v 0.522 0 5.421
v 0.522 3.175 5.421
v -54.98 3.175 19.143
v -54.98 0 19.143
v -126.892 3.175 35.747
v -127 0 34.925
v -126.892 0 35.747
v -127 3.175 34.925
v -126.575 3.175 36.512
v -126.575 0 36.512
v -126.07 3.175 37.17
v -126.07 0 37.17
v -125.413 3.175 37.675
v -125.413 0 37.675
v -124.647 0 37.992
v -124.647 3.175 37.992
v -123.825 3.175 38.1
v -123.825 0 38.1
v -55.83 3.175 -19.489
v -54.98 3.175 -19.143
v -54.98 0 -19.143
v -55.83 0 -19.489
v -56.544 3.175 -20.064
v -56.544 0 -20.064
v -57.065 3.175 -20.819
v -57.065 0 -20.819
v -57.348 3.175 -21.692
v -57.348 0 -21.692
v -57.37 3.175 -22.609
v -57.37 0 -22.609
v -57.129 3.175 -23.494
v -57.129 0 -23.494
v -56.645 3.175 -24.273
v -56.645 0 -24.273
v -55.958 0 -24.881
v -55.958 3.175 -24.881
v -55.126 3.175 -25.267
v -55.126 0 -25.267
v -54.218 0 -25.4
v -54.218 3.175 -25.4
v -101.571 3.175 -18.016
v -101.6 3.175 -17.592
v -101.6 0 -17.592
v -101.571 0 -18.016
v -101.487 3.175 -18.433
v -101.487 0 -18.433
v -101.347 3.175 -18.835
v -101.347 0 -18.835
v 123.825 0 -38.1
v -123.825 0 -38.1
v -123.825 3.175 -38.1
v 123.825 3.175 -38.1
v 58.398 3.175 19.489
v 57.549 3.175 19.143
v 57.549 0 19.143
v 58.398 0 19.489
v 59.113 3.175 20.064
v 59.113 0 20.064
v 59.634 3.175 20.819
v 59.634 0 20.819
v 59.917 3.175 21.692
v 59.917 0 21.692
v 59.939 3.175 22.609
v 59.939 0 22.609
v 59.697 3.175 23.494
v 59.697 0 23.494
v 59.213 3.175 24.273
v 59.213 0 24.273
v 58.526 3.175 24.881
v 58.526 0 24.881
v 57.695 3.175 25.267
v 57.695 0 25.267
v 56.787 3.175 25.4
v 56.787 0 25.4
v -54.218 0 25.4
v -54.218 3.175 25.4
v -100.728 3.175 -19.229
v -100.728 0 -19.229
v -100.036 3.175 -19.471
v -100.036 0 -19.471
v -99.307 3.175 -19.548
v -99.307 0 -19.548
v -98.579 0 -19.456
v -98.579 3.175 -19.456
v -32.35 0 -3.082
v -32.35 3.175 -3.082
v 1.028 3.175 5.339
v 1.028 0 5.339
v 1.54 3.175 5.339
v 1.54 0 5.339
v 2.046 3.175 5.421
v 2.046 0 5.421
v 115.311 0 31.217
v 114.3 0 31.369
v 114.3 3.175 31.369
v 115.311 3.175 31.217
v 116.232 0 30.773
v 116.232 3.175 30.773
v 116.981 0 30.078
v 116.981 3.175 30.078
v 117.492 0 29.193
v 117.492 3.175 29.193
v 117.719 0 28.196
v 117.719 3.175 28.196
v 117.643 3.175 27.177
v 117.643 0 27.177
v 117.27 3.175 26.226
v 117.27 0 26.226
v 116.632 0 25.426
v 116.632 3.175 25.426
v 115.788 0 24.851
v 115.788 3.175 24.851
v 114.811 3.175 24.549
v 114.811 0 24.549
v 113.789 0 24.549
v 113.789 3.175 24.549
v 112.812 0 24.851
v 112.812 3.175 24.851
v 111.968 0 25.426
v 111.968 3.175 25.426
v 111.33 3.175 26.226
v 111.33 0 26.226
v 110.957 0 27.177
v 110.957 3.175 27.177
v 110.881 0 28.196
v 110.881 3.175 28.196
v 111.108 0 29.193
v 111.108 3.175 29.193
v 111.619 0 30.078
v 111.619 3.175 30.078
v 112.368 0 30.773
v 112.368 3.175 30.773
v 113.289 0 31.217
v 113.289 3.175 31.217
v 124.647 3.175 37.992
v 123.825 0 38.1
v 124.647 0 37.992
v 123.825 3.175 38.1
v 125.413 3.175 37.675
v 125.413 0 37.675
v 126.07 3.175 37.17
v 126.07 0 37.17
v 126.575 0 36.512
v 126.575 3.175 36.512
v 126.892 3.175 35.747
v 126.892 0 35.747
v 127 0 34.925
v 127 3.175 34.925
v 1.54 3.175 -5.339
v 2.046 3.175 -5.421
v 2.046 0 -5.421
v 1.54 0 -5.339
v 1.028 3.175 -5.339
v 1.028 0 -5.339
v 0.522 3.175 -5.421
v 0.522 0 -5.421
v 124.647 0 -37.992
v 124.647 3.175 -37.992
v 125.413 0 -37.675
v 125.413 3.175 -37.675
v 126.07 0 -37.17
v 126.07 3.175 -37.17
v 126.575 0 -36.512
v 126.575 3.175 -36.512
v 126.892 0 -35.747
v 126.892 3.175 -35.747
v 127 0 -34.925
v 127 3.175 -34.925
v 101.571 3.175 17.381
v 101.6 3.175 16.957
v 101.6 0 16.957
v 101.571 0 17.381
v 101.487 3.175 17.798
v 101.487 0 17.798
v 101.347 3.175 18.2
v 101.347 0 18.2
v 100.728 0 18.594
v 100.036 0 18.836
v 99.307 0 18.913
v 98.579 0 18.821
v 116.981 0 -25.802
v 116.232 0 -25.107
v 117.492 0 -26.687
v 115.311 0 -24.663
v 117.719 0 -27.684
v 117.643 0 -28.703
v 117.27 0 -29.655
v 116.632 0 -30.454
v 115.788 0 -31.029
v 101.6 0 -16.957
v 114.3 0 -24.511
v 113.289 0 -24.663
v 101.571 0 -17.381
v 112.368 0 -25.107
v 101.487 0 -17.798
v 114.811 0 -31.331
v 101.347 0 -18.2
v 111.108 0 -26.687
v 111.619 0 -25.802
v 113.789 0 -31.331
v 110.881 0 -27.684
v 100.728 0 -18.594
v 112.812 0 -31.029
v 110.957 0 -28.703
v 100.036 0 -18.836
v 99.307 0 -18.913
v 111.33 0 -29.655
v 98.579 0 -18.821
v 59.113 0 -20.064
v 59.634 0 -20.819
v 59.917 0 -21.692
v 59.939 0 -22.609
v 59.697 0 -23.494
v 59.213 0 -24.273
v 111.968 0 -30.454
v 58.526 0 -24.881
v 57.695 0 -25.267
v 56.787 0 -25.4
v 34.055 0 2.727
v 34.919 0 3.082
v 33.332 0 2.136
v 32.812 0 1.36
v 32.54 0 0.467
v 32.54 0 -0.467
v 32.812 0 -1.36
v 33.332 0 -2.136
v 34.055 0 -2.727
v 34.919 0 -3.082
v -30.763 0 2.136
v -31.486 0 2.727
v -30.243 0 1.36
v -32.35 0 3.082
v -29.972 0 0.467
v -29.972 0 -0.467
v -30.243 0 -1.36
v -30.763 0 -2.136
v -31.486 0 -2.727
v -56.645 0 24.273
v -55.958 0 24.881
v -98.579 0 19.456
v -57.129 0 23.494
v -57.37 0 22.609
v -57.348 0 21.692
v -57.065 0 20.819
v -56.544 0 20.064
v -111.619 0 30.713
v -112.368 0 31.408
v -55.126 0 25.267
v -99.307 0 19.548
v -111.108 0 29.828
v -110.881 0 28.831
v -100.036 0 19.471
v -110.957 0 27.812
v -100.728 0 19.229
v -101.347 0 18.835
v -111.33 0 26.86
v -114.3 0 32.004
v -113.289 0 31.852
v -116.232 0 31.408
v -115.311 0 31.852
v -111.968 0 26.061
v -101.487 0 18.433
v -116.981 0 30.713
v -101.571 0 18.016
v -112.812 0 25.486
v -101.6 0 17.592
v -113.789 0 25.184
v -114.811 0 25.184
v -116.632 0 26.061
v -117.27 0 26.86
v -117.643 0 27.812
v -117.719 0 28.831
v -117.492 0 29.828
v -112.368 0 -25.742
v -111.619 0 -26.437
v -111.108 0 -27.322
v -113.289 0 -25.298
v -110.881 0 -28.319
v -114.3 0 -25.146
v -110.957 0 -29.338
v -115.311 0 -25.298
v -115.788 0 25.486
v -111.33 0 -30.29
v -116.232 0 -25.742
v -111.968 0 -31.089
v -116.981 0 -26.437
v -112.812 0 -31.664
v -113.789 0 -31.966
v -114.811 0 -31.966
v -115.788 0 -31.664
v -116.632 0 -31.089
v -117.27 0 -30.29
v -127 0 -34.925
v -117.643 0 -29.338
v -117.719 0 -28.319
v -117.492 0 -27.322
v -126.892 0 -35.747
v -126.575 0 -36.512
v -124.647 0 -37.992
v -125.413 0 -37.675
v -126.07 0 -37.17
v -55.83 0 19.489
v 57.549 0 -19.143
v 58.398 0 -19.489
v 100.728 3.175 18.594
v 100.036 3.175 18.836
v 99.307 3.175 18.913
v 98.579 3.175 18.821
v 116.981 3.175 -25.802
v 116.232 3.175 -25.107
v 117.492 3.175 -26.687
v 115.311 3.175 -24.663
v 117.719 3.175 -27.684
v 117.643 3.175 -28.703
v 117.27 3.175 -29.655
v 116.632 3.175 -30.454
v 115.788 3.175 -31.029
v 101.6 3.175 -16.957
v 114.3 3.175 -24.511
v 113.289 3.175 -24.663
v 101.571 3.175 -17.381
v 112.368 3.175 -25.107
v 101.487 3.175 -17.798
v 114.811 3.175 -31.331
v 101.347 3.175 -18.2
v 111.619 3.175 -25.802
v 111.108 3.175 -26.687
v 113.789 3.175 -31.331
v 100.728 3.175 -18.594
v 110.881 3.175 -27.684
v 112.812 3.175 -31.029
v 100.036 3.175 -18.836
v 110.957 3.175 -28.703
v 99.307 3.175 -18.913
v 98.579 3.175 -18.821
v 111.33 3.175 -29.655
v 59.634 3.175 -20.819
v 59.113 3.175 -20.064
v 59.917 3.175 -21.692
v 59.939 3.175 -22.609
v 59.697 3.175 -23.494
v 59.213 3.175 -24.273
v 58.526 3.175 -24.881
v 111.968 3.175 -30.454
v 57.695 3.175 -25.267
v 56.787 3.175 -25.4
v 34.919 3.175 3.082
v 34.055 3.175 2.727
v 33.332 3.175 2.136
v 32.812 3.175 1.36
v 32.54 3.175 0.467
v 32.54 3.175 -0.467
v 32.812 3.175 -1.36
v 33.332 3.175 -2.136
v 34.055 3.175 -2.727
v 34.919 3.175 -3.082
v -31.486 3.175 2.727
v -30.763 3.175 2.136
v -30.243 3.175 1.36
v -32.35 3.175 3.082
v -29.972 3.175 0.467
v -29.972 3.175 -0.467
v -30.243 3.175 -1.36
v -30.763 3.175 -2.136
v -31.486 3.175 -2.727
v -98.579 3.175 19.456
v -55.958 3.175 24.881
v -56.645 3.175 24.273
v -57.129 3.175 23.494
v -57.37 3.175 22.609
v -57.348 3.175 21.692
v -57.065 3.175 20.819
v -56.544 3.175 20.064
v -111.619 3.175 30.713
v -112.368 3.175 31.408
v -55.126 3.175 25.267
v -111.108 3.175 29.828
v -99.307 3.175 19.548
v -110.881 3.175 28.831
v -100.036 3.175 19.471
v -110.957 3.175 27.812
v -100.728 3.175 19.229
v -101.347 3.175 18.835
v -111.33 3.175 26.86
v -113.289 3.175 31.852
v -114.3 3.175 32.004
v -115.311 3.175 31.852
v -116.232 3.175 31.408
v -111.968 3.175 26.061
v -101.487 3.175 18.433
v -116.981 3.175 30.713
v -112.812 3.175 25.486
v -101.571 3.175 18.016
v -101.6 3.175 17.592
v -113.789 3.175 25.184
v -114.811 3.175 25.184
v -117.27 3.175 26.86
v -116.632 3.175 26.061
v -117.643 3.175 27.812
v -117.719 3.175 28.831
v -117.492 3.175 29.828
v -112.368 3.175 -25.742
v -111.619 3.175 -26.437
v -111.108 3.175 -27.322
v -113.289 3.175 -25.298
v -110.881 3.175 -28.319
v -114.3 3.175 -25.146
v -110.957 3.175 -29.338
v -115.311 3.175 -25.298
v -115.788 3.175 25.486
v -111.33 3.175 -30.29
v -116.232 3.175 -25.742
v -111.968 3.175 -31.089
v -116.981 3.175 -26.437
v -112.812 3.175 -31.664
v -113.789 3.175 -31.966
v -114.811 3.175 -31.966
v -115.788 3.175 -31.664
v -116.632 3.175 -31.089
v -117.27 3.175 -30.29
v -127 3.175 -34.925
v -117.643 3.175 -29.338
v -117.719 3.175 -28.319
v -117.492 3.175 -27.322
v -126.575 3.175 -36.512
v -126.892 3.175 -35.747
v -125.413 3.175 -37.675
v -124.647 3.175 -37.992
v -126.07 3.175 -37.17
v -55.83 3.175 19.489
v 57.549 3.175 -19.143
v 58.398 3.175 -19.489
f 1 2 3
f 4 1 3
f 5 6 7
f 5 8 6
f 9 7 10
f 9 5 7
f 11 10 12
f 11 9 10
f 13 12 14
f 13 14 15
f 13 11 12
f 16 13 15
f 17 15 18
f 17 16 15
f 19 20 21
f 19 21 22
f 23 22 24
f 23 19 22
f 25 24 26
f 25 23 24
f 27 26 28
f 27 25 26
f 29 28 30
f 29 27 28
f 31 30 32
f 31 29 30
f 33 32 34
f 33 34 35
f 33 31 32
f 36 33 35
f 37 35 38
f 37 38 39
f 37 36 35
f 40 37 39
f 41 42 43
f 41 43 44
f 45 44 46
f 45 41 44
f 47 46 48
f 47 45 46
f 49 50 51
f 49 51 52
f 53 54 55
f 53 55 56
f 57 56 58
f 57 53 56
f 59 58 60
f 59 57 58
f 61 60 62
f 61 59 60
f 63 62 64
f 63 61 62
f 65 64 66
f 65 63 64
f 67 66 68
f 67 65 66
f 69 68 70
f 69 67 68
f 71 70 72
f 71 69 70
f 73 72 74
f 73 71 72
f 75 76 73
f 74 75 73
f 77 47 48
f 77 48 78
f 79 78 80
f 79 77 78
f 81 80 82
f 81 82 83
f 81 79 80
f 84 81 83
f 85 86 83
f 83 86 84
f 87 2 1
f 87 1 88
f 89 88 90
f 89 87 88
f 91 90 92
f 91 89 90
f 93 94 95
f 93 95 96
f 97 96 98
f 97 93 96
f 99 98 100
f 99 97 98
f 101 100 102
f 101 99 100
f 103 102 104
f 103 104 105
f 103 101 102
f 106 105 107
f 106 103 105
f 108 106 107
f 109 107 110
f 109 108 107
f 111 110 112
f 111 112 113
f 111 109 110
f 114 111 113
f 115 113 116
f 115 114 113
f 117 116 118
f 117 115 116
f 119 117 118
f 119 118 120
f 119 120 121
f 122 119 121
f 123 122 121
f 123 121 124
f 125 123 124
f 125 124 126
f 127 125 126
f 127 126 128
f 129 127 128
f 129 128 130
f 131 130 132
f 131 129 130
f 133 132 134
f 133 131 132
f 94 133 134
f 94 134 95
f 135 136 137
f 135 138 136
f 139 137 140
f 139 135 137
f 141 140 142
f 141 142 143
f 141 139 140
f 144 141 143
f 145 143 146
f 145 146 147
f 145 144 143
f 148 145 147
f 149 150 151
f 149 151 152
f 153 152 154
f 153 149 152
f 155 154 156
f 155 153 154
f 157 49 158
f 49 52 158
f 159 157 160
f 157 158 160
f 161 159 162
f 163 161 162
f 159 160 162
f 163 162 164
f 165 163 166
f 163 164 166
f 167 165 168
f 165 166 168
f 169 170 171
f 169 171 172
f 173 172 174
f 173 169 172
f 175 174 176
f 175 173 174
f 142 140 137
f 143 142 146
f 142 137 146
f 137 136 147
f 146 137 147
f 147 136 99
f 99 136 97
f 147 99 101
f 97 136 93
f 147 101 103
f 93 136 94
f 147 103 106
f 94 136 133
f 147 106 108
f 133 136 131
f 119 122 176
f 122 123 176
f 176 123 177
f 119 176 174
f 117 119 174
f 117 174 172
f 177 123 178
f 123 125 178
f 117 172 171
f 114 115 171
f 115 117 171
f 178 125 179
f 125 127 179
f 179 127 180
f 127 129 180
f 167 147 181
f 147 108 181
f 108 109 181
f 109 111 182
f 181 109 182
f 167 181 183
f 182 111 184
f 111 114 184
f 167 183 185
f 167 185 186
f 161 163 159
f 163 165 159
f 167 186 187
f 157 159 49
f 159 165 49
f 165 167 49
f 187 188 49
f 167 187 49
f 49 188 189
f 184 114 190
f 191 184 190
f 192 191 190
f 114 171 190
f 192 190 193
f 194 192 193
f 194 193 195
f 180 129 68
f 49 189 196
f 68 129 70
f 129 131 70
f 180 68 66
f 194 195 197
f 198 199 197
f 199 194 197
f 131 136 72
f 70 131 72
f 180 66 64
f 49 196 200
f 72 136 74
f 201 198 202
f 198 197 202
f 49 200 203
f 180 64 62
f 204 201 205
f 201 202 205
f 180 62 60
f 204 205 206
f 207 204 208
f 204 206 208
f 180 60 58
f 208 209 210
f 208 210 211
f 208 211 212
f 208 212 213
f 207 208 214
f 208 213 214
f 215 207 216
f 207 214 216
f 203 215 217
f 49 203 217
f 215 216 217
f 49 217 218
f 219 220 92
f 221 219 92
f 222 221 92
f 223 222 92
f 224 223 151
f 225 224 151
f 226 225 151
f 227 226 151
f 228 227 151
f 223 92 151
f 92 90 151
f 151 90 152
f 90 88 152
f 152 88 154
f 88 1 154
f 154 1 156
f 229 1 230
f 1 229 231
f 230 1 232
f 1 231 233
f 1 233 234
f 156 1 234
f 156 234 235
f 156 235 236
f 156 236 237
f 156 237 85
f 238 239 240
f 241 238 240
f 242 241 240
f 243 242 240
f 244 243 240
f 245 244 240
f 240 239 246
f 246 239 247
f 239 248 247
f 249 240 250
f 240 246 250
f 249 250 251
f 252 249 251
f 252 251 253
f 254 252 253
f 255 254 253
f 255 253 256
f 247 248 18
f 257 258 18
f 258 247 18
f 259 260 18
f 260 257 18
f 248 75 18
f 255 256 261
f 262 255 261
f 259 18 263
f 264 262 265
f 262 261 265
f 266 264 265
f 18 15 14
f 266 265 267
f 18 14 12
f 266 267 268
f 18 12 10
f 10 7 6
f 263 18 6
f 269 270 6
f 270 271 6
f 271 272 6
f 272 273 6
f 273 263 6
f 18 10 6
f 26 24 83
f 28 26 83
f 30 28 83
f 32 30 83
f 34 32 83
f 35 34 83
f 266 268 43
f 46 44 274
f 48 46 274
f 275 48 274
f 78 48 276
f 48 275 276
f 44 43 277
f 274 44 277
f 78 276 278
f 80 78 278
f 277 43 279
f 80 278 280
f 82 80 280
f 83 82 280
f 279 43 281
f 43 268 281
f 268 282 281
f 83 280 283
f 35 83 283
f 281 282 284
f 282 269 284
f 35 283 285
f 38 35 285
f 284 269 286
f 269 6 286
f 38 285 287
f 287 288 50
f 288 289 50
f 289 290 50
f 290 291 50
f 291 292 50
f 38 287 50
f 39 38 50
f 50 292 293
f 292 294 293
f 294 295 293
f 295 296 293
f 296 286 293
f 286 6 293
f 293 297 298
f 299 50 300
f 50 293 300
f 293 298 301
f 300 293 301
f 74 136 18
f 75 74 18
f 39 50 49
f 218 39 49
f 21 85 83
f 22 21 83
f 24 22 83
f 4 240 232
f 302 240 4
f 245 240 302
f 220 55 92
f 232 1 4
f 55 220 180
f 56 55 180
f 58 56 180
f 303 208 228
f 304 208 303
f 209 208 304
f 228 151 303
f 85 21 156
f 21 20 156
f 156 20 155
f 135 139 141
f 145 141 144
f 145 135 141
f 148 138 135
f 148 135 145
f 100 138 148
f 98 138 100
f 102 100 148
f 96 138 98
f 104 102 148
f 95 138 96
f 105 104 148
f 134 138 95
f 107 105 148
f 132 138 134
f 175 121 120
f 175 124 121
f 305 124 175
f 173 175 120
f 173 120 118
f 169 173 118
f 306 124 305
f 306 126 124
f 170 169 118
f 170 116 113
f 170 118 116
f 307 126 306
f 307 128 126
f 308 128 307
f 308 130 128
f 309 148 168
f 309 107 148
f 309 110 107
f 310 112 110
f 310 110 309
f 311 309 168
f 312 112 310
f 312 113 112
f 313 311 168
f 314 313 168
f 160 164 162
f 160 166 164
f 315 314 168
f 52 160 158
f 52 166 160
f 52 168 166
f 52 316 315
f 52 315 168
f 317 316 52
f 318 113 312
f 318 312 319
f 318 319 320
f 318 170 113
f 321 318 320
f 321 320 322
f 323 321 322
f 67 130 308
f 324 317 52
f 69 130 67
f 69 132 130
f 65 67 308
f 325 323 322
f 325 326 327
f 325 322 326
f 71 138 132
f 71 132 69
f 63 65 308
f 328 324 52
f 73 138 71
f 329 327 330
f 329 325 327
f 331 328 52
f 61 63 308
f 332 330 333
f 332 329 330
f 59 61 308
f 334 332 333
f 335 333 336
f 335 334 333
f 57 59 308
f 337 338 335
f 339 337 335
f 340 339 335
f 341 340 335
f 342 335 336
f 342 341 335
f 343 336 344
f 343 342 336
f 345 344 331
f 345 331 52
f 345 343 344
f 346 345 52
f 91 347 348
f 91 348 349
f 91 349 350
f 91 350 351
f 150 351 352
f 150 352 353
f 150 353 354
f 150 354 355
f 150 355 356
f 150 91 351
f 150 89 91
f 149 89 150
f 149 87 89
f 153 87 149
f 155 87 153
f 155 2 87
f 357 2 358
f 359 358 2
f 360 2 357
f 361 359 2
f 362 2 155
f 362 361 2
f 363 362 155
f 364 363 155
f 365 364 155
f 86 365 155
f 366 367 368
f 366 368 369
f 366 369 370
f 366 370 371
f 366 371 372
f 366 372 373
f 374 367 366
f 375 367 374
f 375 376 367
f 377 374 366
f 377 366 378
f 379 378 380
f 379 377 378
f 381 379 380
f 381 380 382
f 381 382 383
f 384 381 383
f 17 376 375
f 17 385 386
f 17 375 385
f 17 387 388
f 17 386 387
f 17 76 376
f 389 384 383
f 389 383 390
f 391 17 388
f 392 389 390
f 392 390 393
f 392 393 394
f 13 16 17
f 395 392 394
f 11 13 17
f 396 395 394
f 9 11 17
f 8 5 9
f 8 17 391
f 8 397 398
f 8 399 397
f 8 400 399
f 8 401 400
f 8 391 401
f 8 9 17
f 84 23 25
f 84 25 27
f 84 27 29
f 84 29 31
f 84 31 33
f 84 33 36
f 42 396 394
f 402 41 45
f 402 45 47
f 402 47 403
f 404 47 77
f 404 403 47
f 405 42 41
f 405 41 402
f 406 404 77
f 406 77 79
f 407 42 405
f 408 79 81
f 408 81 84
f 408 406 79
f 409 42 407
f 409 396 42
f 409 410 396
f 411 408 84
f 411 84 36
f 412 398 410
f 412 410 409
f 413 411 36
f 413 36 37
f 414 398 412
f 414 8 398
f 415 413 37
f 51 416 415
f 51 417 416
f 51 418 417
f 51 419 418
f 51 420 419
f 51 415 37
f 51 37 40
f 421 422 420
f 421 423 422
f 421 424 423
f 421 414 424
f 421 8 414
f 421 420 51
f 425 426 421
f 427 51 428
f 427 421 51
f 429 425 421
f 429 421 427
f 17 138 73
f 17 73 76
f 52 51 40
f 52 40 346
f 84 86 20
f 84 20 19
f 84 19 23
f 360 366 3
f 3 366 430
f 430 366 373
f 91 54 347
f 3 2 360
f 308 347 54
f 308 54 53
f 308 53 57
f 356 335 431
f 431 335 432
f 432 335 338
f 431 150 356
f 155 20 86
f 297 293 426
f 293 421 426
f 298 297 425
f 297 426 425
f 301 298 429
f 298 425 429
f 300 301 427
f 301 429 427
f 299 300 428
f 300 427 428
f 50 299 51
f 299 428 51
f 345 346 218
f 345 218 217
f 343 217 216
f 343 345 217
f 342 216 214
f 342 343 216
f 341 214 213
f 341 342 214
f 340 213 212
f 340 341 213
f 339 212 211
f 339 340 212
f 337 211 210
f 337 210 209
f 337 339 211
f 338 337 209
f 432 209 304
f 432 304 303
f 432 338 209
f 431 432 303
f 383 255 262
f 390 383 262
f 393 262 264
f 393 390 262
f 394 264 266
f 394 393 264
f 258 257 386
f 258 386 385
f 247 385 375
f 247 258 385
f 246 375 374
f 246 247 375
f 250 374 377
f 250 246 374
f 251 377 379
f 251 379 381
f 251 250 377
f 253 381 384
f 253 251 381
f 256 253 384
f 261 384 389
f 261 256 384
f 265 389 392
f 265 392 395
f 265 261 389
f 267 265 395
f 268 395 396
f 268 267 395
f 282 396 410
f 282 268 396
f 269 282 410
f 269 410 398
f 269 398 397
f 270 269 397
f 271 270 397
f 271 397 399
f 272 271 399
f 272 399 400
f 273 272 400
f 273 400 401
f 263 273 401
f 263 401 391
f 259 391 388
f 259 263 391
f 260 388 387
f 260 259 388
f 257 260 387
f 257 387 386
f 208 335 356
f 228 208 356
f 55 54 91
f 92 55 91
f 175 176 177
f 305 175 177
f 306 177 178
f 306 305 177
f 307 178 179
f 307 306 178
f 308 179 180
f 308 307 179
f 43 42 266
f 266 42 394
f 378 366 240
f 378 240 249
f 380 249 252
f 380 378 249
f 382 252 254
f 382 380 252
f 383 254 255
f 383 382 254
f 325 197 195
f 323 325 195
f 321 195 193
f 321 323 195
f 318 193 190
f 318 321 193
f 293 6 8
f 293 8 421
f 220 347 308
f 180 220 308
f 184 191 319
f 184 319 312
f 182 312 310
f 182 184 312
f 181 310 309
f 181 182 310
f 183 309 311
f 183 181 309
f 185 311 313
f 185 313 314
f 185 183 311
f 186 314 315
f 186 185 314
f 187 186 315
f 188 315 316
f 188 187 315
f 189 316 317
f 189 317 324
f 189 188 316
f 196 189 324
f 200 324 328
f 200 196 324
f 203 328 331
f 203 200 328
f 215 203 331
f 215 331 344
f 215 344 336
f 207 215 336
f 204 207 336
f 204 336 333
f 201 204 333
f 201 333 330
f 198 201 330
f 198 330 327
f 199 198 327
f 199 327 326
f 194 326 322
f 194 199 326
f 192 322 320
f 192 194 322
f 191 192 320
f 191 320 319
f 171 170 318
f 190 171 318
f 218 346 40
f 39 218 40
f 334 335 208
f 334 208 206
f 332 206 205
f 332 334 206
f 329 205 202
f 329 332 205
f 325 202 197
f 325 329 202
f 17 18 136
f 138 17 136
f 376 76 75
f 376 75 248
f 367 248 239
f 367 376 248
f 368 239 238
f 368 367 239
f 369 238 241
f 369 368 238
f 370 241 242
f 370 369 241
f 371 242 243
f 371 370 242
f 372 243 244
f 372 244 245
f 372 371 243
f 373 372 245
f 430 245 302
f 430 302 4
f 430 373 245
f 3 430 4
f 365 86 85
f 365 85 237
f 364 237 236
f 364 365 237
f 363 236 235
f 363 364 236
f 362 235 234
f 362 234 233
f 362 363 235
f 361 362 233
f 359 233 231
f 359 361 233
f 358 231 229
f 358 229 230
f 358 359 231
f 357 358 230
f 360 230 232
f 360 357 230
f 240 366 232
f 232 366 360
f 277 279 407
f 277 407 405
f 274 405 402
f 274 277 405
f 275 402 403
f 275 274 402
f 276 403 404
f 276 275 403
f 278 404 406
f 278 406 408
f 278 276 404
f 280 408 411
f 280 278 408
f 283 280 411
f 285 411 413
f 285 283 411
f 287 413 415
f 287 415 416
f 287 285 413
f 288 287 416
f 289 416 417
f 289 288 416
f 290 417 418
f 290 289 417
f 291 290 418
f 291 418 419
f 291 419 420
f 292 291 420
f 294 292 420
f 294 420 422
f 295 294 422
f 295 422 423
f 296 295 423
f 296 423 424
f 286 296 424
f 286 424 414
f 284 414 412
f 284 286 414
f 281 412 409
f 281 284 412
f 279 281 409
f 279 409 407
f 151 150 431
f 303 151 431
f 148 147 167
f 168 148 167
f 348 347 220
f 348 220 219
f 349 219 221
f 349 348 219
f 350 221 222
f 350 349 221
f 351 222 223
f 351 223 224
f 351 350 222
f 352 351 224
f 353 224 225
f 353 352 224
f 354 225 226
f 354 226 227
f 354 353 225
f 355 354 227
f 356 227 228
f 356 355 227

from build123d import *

# Parameters (mm, degrees)
SKETCH1_W           = 254
SKETCH1_H           = 76.2
SKETCH1_R           = 3.429
BOSS_EXTRUDE1_DEPTH = 3.175
FILLET1_R           = 3.175
CUT_EXTRUDE1_DEPTH  = 133.629900946
FILLET3_R           = 3.175


with BuildPart() as part:
    # Sketch1 → Boss-Extrude1 (new body)
    with BuildSketch(Plane(origin=(0, 0, 0), x_dir=(1, 0, 0), z_dir=(0, 1, 0))):
        Rectangle(SKETCH1_W, SKETCH1_H)
        with Locations(Location((-114.3, 28.575, 0), (0, 0, 270))):
            Circle(SKETCH1_R, mode=Mode.SUBTRACT)
        with Locations(Location((-114.3, -28.575, 0), (0, 0, 270))):
            Circle(SKETCH1_R, mode=Mode.SUBTRACT)
        with Locations(Location((114.3, 27.94, 0), (0, 0, 270))):
            Circle(SKETCH1_R, mode=Mode.SUBTRACT)
        with Locations(Location((114.3, -27.94, 0), (0, 0, 270))):
            Circle(SKETCH1_R, mode=Mode.SUBTRACT)
    extrude(amount=BOSS_EXTRUDE1_DEPTH)

    # Fillet1
    fillet1_edges = [part.edges().sort_by_distance(p)[0] for p in [
        (127, 1.5875, 38.1),
        (-127, 1.5875, 38.1),
        (-127, 1.5875, -38.1),
        (127, 1.5875, -38.1),
    ]]
    fillet(fillet1_edges, radius=FILLET1_R)

    # Sketch2 → Cut-Extrude1 (cut, through all)
    with BuildSketch(Plane(origin=(0, 3.175, 0), x_dir=(1, 0, 0), z_dir=(0, 1, 0))):
        with BuildLine():
            ThreePointArc((-100.658473406, 19.969571877), (-101.112278779, 19.289061706), (-101.6, 18.632432877))
            Line((-101.6, 18.632432877), (-101.6, -18.632432877))
            ThreePointArc((-101.6, -18.632432877), (-101.112278779, -19.289061706), (-100.658473406, -19.969571877))
            Line((-100.658473406, -19.969571877), (-19.882677051, 0))
            Line((-19.882677051, 0), (-100.658473406, 19.969571877))
        make_face()
        Polygon((82.858895983, 25.4), (-80.290356657, 25.4), (1.284269663, 5.232939604), align=None)
        Polygon((82.858895983, -25.4), (1.284269663, -5.232939604), (-80.290356657, -25.4), align=None)
        with BuildLine():
            Line((100.658473406, 19.334571877), (22.451216377, 0))
            Line((22.451216377, 0), (100.658473406, -19.334571877))
            ThreePointArc((100.658473406, -19.334571877), (101.112278779, -18.654061706), (101.6, -17.997432877))
            Line((101.6, -17.997432877), (101.6, 17.997432877))
            ThreePointArc((101.6, 17.997432877), (101.112278779, 18.654061706), (100.658473406, 19.334571877))
        make_face()
    extrude(amount=-CUT_EXTRUDE1_DEPTH, mode=Mode.SUBTRACT)

    # Fillet3
    # the kernel refuses this fillet: 3.175 mm, written as the material it adds along each edge
    with BuildSketch(Plane(origin=(100.658473406, 3.175, 19.334571877), x_dir=(-0.9707736729696135, 0, -0.23999682470625738), z_dir=(0, -1, 0)), Plane(origin=(-100.658473406, 3.175, -19.969571877), x_dir=(0.9707736729696127, 0, 0.23999682470626046), z_dir=(0, -1, 0))) as fillet3_piece_1:
        with BuildLine():
            CenterArc((2.141800615, 3.175), FILLET3_R, 205.317347828, 64.682652172)
            ThreePointArc((-0.728250522, 1.817269737), (-0.336527011, 0.919694558), (0, 0))
            Line((0, 0), (2.141800615, 0))
        make_face()
    extrude(amount=3.175)
    with BuildSketch(Plane(origin=(22.451216377, 3.175, 0), x_dir=(0.9707736729695857, 0, -0.23999682470636963), z_dir=(0, -1, 0)), Plane(origin=(-19.882677051, 3.175, 0), x_dir=(-0.9707736729695856, 0, 0.23999682470636988), z_dir=(0, -1, 0))) as fillet3_piece_2:
        with BuildLine():
            CenterArc((FILLET3_R * 4.04494382022, FILLET3_R), FILLET3_R, 117.772705909, 152.227294091)
            Line((FILLET3_R * 3.57897862218, FILLET3_R * 1.88480304826), (0, 0))
            Line((0, 0), (FILLET3_R * 4.04494382022, 0))
        make_face()
    extrude(amount=3.175)
    with BuildSketch(Plane(origin=(100.658473406, 3.175, -19.334571877), x_dir=(-0.970773672969613, 0, 0.23999682470625897), z_dir=(0, -1, 0))) as fillet3_piece_3:
        with BuildLine():
            CenterArc((2.141800615, -3.175), FILLET3_R, 90, 64.682652172)
            ThreePointArc((-0.728250522, -1.817269737), (-0.336527011, -0.919694558), (0, 0))
            Line((0, 0), (2.141800615, 0))
        make_face()
    extrude(amount=3.175)
    with BuildSketch(Plane(origin=(82.858895983, 3.175, -25.4), x_dir=(-0.9707736729695856, 0, 0.23999682470636996), z_dir=(0, -1, 0)), Plane(origin=(-80.290356657, 3.175, 25.4), x_dir=(0.9707736729695856, 0, -0.23999682470636974), z_dir=(0, -1, 0)), Plane(origin=(-80.290356657, 3.175, -25.4), x_dir=(1, 0, 0), z_dir=(0, -1, 0))) as fillet3_piece_4:
        with BuildLine():
            CenterArc((FILLET3_R * 8.21166561425, FILLET3_R), FILLET3_R, 103.886352954, 166.113647046)
            Line((FILLET3_R * 7.97166878954, FILLET3_R * 1.97077367297), (0, 0))
            Line((0, 0), (FILLET3_R * 8.21166561425, 0))
        make_face()
    extrude(amount=3.175)
    with BuildSketch(Plane(origin=(82.858895983, 3.175, 25.4), x_dir=(-0.9707736729695857, 0, -0.2399968247063698), z_dir=(0, -1, 0))) as fillet3_piece_5:
        with BuildLine():
            CenterArc((FILLET3_R * 8.21166561425, -FILLET3_R), FILLET3_R, 90, 166.113647046)
            Line((FILLET3_R * 7.97166878954, -FILLET3_R * 1.97077367297), (0, 0))
            Line((0, 0), (FILLET3_R * 8.21166561425, 0))
        make_face()
    extrude(amount=3.175)
    with BuildSketch(Plane(origin=(-100.658473406, 3.175, 19.969571877), x_dir=(-0.5838848021252715, 0, -0.811836521626819), z_dir=(0, -1, 0))) as fillet3_piece_6:
        with BuildLine():
            CenterArc((2.150451203, 3.169147283), FILLET3_R, 201.837892452, 64.682652172)
            Line((-0.796710862, 1.988105047), (0, 0))
            ThreePointArc((0, 0), (0.978879221, 0.029731803), (1.957758443, 0))
        make_face()
    extrude(amount=3.175)
    with BuildSketch(Plane(origin=(1.284269663, 3.175, -5.232939604), x_dir=(0.9707736729695848, 0, -0.23999682470637296), z_dir=(0, -1, 0))) as fillet3_piece_7:
        with BuildLine():
            CenterArc((FILLET3_R * 0.247222222222, -FILLET3_R), FILLET3_R, 90, 27.772705909)
            Line((-FILLET3_R * 0.21874297582, -FILLET3_R * 0.115196951738), (0, 0))
            Line((0, 0), (FILLET3_R * 0.247222222222, 0))
        make_face()
    extrude(amount=3.175)
    with BuildSketch(Plane(origin=(1.284269663, 3.175, 5.232939604), x_dir=(0.9707736729695816, 0, 0.23999682470638586), z_dir=(0, -1, 0))) as fillet3_piece_8:
        with BuildLine():
            CenterArc((FILLET3_R * 0.247222222222, FILLET3_R), FILLET3_R, 242.227294091, 27.772705909)
            Line((-FILLET3_R * 0.21874297582, FILLET3_R * 0.115196951738), (0, 0))
            Line((0, 0), (FILLET3_R * 0.247222222222, 0))
        make_face()
    extrude(amount=3.175)
    with BuildSketch(Plane(origin=(101.6, 3.175, -17.997432877), x_dir=(0, 0, 1), z_dir=(0, -1, 0)), Plane(origin=(-101.6, 3.175, 18.632432877), x_dir=(0, 0, -1), z_dir=(0, -1, 0))) as fillet3_piece_9:
        with BuildLine():
            CenterArc((1.040546779, 3.175), FILLET3_R, 235.322589412, 34.677410588)
            ThreePointArc((-0.765886428, 0.563980263), (-0.378785041, 0.28763694), (0, 0))
            Line((0, 0), (1.040546779, 0))
        make_face()
    extrude(amount=3.175)
    with BuildSketch(Plane(origin=(101.6, 3.175, 17.997432877), x_dir=(-0.5929556750159476, 0, 0.8052351007416294), z_dir=(0, -1, 0))) as fillet3_piece_10:
        with BuildLine():
            CenterArc((1.044749477, 3.173619563), FILLET3_R, 233.63296639, 34.677410588)
            Line((-0.837884791, 0.616998118), (0, 0))
            ThreePointArc((0, 0), (0.475566966, 0.007012621), (0.951133933, 0))
        make_face()
    extrude(amount=3.175)
    with BuildSketch(Plane(origin=(-101.6, 3.175, -18.632432877), x_dir=(0, 0, 1), z_dir=(0, -1, 0))) as fillet3_piece_11:
        with BuildLine():
            CenterArc((1.040546779, -3.175), FILLET3_R, 90, 34.677410588)
            ThreePointArc((-0.765886428, -0.563980263), (-0.378785041, -0.28763694), (0, 0))
            Line((0, 0), (1.040546779, 0))
        make_face()
    extrude(amount=3.175)


solid = part.part
